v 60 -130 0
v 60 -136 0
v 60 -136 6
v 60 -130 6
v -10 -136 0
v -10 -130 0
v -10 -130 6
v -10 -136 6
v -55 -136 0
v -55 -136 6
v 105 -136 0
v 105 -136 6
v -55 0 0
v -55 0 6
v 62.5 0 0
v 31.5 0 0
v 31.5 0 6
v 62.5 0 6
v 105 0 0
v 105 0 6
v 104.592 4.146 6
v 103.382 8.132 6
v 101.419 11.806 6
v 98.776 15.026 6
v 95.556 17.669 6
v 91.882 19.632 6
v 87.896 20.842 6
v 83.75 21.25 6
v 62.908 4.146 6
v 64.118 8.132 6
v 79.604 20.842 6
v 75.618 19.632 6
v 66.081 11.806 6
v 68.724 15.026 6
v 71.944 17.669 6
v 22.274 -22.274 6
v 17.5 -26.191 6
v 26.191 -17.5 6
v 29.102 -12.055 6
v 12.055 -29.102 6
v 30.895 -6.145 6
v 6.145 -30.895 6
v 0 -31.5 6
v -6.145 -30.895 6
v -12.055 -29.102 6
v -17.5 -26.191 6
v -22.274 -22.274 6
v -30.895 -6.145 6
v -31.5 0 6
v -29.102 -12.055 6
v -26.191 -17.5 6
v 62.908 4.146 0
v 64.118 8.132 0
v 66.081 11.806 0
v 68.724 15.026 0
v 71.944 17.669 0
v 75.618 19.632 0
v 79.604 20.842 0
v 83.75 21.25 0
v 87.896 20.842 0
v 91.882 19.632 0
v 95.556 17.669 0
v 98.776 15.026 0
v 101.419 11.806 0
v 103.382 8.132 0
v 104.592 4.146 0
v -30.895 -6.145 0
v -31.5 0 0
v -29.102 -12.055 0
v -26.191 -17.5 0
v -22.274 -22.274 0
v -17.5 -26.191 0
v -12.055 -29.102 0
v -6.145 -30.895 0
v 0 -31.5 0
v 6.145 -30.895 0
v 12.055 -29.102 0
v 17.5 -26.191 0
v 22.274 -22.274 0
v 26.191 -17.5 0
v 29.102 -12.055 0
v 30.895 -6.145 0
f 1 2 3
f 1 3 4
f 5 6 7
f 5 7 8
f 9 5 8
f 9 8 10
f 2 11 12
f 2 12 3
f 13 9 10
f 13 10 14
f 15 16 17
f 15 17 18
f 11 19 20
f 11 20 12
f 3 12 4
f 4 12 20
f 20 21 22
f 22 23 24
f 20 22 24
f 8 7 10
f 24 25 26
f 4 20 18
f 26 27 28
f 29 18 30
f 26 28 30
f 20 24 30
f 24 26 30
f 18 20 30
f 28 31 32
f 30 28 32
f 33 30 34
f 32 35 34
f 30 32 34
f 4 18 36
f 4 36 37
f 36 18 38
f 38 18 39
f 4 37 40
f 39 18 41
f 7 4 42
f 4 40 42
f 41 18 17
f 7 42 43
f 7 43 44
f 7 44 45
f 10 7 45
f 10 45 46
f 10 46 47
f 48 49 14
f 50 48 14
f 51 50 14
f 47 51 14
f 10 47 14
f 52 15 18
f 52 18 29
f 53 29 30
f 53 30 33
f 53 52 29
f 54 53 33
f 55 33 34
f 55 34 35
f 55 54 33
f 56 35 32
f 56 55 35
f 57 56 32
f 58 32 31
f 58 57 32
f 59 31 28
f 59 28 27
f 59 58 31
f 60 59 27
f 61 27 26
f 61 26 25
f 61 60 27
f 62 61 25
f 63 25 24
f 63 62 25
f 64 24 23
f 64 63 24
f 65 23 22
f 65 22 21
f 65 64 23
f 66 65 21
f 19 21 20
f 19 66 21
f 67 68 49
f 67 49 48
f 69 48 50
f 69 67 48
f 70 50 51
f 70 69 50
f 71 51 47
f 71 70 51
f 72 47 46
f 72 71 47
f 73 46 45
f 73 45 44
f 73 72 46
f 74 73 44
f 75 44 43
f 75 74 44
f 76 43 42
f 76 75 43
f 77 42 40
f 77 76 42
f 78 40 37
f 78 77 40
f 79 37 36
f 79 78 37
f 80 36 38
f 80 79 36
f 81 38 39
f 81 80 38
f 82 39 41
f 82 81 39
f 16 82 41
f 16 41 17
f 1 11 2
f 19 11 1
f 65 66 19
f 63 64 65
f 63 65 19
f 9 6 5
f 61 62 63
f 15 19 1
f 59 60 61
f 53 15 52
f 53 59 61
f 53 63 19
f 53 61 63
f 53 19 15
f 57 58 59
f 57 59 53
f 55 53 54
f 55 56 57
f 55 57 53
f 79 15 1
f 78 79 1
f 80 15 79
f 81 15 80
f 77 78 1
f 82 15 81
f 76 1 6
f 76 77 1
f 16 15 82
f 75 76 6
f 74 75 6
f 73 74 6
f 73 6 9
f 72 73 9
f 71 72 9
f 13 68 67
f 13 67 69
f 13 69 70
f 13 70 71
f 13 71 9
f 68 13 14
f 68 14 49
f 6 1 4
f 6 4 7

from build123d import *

# Parameters (mm, degrees)
BOSS_EXTRUDE1_DEPTH = 6


with BuildPart() as part:
    # Sketch1 → Boss-Extrude1 (new body)
    with BuildSketch(Plane.XY):
        with BuildLine():
            Line((-55, 0), (-31.5, 0))
            ThreePointArc((-31.5, 0), (0, -31.5), (31.5, 0))
            Line((31.5, 0), (62.5, 0))
            ThreePointArc((62.5, 0), (83.75, 21.25), (105, 0))
            Line((105, 0), (105, -136))
            Line((105, -136), (60, -136))
            Line((60, -136), (60, -130))
            Line((60, -130), (-10, -130))
            Line((-10, -130), (-10, -136))
            Line((-10, -136), (-55, -136))
            Line((-55, -136), (-55, 0))
        make_face()
    extrude(amount=BOSS_EXTRUDE1_DEPTH)


solid = part.part
